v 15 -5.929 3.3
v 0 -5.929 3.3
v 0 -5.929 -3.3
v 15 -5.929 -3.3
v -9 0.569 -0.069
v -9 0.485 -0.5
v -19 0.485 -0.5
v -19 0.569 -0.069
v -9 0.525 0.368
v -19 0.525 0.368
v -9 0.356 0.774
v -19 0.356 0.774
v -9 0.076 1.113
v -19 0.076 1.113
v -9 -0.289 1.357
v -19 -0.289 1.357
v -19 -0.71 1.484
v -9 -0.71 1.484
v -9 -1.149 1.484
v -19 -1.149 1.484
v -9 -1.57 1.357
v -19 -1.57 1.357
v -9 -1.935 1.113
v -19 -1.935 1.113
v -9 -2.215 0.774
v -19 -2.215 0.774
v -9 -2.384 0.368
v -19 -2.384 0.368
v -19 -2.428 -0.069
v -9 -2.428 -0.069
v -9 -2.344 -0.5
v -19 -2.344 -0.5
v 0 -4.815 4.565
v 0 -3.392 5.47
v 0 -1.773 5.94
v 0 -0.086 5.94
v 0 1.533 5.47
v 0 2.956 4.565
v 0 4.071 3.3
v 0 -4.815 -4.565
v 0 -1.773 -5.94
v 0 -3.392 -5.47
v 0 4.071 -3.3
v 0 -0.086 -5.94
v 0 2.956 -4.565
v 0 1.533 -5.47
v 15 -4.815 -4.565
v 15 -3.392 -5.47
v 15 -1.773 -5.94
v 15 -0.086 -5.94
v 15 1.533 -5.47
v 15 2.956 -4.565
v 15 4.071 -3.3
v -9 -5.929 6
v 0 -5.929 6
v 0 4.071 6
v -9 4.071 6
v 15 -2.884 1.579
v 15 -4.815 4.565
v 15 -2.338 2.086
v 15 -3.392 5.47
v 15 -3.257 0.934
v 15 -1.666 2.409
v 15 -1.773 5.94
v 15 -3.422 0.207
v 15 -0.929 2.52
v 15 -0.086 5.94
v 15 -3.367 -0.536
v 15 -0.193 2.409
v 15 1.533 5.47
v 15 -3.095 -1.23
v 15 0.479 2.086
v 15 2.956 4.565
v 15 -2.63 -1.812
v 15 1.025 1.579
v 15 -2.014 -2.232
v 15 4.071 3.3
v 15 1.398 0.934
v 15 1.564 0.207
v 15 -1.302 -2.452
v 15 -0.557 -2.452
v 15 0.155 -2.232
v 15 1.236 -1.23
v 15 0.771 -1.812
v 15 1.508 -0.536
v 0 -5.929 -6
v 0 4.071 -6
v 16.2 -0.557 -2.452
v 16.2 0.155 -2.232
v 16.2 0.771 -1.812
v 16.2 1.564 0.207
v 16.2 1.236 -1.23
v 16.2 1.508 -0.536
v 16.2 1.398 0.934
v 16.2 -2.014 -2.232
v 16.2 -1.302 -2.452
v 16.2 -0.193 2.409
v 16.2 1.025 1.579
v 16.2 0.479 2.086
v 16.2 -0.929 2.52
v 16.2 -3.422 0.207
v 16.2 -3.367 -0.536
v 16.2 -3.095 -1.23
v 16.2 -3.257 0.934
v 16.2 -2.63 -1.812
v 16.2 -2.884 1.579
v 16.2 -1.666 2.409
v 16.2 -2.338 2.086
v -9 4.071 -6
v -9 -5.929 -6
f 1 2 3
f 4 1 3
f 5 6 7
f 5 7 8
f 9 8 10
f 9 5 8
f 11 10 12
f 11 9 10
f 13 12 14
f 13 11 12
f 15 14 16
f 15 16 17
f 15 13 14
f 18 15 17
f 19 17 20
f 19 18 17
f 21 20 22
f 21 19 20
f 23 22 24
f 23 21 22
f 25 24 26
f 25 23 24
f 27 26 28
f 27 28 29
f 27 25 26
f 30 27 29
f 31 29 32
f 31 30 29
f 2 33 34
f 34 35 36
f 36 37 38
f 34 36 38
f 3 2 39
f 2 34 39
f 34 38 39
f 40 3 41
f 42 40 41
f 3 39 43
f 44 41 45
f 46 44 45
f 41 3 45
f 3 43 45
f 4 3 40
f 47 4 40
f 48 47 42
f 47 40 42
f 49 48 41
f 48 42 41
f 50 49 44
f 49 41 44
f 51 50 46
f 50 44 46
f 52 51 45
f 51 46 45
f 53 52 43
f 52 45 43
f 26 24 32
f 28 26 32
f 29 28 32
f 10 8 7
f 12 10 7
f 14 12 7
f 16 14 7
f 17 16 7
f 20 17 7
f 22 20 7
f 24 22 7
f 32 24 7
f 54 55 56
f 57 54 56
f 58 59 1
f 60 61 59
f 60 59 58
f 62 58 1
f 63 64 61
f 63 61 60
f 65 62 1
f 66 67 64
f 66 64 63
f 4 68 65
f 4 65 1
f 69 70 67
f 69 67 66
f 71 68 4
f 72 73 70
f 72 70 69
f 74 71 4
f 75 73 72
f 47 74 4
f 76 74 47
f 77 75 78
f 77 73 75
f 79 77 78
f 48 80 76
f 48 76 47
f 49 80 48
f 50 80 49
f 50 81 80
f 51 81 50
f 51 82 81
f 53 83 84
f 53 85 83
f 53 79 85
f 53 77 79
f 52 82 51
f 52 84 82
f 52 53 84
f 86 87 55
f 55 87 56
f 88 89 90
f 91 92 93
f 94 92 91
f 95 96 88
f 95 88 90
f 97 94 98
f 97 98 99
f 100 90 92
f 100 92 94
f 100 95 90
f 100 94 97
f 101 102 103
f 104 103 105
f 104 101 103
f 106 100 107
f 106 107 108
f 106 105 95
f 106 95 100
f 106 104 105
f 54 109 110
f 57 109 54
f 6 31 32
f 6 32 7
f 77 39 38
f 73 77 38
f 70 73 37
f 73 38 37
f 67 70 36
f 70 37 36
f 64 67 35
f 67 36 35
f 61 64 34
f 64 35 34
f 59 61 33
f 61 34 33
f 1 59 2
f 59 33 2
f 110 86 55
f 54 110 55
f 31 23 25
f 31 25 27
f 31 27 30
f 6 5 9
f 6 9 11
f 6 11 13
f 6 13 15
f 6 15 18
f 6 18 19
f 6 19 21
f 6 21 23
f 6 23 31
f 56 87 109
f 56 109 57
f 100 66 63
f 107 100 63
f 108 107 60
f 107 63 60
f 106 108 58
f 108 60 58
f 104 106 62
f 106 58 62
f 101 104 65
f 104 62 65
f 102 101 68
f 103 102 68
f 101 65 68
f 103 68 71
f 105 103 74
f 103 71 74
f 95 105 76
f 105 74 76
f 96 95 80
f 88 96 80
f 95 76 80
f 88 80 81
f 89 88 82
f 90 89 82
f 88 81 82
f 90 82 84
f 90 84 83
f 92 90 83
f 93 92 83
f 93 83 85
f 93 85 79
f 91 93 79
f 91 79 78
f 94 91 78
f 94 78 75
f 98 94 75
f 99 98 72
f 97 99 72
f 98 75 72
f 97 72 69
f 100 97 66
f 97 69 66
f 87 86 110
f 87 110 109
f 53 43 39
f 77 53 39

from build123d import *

# Parameters (mm, degrees)
BOSS_EXTRUDE1_DEPTH = 15
SKETCH3_W           = 12
SKETCH3_H           = 10
BOSS_EXTRUDE2_DEPTH = 9
BOSS_EXTRUDE3_DEPTH = 10
SKETCH6_R           = 2.5
BOSS_EXTRUDE4_DEPTH = 1.2


with BuildPart() as part:
    # Sketch1 → Boss-Extrude1 (new body)
    with BuildSketch(Plane(origin=(0, 0, 0), x_dir=(0, 0, -1), z_dir=(1, 0, 0))):
        with BuildLine():
            Line((3.3, 4.070512821), (-3.3, 4.070512821))
            ThreePointArc((-3.3, 4.070512821), (-6, -0.929487179), (-3.3, -5.929487179))
            Line((-3.3, -5.929487179), (3.3, -5.929487179))
            ThreePointArc((3.3, -5.929487179), (6, -0.929487179), (3.3, 4.070512821))
        make_face()
    extrude(amount=BOSS_EXTRUDE1_DEPTH)

    # Sketch6 → Boss-Extrude4 (add)
    with BuildSketch(Plane(origin=(15, 0, 0), x_dir=(0, 0, -1), z_dir=(1, 0, 0))):
        with Locations(Location((-0.02037037, -0.929487179, 0), (0, 0, 180))):
            Circle(SKETCH6_R)
    extrude(amount=BOSS_EXTRUDE4_DEPTH)


with BuildPart() as body_2:
    # Sketch3 → Boss-Extrude2 (new body)
    with BuildSketch(Plane.ZY):
        with Locations((0, -0.929487179)):
            Rectangle(SKETCH3_W, SKETCH3_H)
    extrude(amount=BOSS_EXTRUDE2_DEPTH)


with BuildPart() as body_3:
    # Sketch4 → Boss-Extrude3 (new body)
    with BuildSketch(Plane.ZY.offset(9)):
        with BuildLine():
            Line((-0.5, -2.343700742), (-0.5, 0.484726383))
            ThreePointArc((-0.5, 0.484726383), (1.5, -0.929487179), (-0.5, -2.343700742))
        make_face()
    extrude(amount=BOSS_EXTRUDE3_DEPTH)


solid = Compound([part.part, body_2.part, body_3.part])
